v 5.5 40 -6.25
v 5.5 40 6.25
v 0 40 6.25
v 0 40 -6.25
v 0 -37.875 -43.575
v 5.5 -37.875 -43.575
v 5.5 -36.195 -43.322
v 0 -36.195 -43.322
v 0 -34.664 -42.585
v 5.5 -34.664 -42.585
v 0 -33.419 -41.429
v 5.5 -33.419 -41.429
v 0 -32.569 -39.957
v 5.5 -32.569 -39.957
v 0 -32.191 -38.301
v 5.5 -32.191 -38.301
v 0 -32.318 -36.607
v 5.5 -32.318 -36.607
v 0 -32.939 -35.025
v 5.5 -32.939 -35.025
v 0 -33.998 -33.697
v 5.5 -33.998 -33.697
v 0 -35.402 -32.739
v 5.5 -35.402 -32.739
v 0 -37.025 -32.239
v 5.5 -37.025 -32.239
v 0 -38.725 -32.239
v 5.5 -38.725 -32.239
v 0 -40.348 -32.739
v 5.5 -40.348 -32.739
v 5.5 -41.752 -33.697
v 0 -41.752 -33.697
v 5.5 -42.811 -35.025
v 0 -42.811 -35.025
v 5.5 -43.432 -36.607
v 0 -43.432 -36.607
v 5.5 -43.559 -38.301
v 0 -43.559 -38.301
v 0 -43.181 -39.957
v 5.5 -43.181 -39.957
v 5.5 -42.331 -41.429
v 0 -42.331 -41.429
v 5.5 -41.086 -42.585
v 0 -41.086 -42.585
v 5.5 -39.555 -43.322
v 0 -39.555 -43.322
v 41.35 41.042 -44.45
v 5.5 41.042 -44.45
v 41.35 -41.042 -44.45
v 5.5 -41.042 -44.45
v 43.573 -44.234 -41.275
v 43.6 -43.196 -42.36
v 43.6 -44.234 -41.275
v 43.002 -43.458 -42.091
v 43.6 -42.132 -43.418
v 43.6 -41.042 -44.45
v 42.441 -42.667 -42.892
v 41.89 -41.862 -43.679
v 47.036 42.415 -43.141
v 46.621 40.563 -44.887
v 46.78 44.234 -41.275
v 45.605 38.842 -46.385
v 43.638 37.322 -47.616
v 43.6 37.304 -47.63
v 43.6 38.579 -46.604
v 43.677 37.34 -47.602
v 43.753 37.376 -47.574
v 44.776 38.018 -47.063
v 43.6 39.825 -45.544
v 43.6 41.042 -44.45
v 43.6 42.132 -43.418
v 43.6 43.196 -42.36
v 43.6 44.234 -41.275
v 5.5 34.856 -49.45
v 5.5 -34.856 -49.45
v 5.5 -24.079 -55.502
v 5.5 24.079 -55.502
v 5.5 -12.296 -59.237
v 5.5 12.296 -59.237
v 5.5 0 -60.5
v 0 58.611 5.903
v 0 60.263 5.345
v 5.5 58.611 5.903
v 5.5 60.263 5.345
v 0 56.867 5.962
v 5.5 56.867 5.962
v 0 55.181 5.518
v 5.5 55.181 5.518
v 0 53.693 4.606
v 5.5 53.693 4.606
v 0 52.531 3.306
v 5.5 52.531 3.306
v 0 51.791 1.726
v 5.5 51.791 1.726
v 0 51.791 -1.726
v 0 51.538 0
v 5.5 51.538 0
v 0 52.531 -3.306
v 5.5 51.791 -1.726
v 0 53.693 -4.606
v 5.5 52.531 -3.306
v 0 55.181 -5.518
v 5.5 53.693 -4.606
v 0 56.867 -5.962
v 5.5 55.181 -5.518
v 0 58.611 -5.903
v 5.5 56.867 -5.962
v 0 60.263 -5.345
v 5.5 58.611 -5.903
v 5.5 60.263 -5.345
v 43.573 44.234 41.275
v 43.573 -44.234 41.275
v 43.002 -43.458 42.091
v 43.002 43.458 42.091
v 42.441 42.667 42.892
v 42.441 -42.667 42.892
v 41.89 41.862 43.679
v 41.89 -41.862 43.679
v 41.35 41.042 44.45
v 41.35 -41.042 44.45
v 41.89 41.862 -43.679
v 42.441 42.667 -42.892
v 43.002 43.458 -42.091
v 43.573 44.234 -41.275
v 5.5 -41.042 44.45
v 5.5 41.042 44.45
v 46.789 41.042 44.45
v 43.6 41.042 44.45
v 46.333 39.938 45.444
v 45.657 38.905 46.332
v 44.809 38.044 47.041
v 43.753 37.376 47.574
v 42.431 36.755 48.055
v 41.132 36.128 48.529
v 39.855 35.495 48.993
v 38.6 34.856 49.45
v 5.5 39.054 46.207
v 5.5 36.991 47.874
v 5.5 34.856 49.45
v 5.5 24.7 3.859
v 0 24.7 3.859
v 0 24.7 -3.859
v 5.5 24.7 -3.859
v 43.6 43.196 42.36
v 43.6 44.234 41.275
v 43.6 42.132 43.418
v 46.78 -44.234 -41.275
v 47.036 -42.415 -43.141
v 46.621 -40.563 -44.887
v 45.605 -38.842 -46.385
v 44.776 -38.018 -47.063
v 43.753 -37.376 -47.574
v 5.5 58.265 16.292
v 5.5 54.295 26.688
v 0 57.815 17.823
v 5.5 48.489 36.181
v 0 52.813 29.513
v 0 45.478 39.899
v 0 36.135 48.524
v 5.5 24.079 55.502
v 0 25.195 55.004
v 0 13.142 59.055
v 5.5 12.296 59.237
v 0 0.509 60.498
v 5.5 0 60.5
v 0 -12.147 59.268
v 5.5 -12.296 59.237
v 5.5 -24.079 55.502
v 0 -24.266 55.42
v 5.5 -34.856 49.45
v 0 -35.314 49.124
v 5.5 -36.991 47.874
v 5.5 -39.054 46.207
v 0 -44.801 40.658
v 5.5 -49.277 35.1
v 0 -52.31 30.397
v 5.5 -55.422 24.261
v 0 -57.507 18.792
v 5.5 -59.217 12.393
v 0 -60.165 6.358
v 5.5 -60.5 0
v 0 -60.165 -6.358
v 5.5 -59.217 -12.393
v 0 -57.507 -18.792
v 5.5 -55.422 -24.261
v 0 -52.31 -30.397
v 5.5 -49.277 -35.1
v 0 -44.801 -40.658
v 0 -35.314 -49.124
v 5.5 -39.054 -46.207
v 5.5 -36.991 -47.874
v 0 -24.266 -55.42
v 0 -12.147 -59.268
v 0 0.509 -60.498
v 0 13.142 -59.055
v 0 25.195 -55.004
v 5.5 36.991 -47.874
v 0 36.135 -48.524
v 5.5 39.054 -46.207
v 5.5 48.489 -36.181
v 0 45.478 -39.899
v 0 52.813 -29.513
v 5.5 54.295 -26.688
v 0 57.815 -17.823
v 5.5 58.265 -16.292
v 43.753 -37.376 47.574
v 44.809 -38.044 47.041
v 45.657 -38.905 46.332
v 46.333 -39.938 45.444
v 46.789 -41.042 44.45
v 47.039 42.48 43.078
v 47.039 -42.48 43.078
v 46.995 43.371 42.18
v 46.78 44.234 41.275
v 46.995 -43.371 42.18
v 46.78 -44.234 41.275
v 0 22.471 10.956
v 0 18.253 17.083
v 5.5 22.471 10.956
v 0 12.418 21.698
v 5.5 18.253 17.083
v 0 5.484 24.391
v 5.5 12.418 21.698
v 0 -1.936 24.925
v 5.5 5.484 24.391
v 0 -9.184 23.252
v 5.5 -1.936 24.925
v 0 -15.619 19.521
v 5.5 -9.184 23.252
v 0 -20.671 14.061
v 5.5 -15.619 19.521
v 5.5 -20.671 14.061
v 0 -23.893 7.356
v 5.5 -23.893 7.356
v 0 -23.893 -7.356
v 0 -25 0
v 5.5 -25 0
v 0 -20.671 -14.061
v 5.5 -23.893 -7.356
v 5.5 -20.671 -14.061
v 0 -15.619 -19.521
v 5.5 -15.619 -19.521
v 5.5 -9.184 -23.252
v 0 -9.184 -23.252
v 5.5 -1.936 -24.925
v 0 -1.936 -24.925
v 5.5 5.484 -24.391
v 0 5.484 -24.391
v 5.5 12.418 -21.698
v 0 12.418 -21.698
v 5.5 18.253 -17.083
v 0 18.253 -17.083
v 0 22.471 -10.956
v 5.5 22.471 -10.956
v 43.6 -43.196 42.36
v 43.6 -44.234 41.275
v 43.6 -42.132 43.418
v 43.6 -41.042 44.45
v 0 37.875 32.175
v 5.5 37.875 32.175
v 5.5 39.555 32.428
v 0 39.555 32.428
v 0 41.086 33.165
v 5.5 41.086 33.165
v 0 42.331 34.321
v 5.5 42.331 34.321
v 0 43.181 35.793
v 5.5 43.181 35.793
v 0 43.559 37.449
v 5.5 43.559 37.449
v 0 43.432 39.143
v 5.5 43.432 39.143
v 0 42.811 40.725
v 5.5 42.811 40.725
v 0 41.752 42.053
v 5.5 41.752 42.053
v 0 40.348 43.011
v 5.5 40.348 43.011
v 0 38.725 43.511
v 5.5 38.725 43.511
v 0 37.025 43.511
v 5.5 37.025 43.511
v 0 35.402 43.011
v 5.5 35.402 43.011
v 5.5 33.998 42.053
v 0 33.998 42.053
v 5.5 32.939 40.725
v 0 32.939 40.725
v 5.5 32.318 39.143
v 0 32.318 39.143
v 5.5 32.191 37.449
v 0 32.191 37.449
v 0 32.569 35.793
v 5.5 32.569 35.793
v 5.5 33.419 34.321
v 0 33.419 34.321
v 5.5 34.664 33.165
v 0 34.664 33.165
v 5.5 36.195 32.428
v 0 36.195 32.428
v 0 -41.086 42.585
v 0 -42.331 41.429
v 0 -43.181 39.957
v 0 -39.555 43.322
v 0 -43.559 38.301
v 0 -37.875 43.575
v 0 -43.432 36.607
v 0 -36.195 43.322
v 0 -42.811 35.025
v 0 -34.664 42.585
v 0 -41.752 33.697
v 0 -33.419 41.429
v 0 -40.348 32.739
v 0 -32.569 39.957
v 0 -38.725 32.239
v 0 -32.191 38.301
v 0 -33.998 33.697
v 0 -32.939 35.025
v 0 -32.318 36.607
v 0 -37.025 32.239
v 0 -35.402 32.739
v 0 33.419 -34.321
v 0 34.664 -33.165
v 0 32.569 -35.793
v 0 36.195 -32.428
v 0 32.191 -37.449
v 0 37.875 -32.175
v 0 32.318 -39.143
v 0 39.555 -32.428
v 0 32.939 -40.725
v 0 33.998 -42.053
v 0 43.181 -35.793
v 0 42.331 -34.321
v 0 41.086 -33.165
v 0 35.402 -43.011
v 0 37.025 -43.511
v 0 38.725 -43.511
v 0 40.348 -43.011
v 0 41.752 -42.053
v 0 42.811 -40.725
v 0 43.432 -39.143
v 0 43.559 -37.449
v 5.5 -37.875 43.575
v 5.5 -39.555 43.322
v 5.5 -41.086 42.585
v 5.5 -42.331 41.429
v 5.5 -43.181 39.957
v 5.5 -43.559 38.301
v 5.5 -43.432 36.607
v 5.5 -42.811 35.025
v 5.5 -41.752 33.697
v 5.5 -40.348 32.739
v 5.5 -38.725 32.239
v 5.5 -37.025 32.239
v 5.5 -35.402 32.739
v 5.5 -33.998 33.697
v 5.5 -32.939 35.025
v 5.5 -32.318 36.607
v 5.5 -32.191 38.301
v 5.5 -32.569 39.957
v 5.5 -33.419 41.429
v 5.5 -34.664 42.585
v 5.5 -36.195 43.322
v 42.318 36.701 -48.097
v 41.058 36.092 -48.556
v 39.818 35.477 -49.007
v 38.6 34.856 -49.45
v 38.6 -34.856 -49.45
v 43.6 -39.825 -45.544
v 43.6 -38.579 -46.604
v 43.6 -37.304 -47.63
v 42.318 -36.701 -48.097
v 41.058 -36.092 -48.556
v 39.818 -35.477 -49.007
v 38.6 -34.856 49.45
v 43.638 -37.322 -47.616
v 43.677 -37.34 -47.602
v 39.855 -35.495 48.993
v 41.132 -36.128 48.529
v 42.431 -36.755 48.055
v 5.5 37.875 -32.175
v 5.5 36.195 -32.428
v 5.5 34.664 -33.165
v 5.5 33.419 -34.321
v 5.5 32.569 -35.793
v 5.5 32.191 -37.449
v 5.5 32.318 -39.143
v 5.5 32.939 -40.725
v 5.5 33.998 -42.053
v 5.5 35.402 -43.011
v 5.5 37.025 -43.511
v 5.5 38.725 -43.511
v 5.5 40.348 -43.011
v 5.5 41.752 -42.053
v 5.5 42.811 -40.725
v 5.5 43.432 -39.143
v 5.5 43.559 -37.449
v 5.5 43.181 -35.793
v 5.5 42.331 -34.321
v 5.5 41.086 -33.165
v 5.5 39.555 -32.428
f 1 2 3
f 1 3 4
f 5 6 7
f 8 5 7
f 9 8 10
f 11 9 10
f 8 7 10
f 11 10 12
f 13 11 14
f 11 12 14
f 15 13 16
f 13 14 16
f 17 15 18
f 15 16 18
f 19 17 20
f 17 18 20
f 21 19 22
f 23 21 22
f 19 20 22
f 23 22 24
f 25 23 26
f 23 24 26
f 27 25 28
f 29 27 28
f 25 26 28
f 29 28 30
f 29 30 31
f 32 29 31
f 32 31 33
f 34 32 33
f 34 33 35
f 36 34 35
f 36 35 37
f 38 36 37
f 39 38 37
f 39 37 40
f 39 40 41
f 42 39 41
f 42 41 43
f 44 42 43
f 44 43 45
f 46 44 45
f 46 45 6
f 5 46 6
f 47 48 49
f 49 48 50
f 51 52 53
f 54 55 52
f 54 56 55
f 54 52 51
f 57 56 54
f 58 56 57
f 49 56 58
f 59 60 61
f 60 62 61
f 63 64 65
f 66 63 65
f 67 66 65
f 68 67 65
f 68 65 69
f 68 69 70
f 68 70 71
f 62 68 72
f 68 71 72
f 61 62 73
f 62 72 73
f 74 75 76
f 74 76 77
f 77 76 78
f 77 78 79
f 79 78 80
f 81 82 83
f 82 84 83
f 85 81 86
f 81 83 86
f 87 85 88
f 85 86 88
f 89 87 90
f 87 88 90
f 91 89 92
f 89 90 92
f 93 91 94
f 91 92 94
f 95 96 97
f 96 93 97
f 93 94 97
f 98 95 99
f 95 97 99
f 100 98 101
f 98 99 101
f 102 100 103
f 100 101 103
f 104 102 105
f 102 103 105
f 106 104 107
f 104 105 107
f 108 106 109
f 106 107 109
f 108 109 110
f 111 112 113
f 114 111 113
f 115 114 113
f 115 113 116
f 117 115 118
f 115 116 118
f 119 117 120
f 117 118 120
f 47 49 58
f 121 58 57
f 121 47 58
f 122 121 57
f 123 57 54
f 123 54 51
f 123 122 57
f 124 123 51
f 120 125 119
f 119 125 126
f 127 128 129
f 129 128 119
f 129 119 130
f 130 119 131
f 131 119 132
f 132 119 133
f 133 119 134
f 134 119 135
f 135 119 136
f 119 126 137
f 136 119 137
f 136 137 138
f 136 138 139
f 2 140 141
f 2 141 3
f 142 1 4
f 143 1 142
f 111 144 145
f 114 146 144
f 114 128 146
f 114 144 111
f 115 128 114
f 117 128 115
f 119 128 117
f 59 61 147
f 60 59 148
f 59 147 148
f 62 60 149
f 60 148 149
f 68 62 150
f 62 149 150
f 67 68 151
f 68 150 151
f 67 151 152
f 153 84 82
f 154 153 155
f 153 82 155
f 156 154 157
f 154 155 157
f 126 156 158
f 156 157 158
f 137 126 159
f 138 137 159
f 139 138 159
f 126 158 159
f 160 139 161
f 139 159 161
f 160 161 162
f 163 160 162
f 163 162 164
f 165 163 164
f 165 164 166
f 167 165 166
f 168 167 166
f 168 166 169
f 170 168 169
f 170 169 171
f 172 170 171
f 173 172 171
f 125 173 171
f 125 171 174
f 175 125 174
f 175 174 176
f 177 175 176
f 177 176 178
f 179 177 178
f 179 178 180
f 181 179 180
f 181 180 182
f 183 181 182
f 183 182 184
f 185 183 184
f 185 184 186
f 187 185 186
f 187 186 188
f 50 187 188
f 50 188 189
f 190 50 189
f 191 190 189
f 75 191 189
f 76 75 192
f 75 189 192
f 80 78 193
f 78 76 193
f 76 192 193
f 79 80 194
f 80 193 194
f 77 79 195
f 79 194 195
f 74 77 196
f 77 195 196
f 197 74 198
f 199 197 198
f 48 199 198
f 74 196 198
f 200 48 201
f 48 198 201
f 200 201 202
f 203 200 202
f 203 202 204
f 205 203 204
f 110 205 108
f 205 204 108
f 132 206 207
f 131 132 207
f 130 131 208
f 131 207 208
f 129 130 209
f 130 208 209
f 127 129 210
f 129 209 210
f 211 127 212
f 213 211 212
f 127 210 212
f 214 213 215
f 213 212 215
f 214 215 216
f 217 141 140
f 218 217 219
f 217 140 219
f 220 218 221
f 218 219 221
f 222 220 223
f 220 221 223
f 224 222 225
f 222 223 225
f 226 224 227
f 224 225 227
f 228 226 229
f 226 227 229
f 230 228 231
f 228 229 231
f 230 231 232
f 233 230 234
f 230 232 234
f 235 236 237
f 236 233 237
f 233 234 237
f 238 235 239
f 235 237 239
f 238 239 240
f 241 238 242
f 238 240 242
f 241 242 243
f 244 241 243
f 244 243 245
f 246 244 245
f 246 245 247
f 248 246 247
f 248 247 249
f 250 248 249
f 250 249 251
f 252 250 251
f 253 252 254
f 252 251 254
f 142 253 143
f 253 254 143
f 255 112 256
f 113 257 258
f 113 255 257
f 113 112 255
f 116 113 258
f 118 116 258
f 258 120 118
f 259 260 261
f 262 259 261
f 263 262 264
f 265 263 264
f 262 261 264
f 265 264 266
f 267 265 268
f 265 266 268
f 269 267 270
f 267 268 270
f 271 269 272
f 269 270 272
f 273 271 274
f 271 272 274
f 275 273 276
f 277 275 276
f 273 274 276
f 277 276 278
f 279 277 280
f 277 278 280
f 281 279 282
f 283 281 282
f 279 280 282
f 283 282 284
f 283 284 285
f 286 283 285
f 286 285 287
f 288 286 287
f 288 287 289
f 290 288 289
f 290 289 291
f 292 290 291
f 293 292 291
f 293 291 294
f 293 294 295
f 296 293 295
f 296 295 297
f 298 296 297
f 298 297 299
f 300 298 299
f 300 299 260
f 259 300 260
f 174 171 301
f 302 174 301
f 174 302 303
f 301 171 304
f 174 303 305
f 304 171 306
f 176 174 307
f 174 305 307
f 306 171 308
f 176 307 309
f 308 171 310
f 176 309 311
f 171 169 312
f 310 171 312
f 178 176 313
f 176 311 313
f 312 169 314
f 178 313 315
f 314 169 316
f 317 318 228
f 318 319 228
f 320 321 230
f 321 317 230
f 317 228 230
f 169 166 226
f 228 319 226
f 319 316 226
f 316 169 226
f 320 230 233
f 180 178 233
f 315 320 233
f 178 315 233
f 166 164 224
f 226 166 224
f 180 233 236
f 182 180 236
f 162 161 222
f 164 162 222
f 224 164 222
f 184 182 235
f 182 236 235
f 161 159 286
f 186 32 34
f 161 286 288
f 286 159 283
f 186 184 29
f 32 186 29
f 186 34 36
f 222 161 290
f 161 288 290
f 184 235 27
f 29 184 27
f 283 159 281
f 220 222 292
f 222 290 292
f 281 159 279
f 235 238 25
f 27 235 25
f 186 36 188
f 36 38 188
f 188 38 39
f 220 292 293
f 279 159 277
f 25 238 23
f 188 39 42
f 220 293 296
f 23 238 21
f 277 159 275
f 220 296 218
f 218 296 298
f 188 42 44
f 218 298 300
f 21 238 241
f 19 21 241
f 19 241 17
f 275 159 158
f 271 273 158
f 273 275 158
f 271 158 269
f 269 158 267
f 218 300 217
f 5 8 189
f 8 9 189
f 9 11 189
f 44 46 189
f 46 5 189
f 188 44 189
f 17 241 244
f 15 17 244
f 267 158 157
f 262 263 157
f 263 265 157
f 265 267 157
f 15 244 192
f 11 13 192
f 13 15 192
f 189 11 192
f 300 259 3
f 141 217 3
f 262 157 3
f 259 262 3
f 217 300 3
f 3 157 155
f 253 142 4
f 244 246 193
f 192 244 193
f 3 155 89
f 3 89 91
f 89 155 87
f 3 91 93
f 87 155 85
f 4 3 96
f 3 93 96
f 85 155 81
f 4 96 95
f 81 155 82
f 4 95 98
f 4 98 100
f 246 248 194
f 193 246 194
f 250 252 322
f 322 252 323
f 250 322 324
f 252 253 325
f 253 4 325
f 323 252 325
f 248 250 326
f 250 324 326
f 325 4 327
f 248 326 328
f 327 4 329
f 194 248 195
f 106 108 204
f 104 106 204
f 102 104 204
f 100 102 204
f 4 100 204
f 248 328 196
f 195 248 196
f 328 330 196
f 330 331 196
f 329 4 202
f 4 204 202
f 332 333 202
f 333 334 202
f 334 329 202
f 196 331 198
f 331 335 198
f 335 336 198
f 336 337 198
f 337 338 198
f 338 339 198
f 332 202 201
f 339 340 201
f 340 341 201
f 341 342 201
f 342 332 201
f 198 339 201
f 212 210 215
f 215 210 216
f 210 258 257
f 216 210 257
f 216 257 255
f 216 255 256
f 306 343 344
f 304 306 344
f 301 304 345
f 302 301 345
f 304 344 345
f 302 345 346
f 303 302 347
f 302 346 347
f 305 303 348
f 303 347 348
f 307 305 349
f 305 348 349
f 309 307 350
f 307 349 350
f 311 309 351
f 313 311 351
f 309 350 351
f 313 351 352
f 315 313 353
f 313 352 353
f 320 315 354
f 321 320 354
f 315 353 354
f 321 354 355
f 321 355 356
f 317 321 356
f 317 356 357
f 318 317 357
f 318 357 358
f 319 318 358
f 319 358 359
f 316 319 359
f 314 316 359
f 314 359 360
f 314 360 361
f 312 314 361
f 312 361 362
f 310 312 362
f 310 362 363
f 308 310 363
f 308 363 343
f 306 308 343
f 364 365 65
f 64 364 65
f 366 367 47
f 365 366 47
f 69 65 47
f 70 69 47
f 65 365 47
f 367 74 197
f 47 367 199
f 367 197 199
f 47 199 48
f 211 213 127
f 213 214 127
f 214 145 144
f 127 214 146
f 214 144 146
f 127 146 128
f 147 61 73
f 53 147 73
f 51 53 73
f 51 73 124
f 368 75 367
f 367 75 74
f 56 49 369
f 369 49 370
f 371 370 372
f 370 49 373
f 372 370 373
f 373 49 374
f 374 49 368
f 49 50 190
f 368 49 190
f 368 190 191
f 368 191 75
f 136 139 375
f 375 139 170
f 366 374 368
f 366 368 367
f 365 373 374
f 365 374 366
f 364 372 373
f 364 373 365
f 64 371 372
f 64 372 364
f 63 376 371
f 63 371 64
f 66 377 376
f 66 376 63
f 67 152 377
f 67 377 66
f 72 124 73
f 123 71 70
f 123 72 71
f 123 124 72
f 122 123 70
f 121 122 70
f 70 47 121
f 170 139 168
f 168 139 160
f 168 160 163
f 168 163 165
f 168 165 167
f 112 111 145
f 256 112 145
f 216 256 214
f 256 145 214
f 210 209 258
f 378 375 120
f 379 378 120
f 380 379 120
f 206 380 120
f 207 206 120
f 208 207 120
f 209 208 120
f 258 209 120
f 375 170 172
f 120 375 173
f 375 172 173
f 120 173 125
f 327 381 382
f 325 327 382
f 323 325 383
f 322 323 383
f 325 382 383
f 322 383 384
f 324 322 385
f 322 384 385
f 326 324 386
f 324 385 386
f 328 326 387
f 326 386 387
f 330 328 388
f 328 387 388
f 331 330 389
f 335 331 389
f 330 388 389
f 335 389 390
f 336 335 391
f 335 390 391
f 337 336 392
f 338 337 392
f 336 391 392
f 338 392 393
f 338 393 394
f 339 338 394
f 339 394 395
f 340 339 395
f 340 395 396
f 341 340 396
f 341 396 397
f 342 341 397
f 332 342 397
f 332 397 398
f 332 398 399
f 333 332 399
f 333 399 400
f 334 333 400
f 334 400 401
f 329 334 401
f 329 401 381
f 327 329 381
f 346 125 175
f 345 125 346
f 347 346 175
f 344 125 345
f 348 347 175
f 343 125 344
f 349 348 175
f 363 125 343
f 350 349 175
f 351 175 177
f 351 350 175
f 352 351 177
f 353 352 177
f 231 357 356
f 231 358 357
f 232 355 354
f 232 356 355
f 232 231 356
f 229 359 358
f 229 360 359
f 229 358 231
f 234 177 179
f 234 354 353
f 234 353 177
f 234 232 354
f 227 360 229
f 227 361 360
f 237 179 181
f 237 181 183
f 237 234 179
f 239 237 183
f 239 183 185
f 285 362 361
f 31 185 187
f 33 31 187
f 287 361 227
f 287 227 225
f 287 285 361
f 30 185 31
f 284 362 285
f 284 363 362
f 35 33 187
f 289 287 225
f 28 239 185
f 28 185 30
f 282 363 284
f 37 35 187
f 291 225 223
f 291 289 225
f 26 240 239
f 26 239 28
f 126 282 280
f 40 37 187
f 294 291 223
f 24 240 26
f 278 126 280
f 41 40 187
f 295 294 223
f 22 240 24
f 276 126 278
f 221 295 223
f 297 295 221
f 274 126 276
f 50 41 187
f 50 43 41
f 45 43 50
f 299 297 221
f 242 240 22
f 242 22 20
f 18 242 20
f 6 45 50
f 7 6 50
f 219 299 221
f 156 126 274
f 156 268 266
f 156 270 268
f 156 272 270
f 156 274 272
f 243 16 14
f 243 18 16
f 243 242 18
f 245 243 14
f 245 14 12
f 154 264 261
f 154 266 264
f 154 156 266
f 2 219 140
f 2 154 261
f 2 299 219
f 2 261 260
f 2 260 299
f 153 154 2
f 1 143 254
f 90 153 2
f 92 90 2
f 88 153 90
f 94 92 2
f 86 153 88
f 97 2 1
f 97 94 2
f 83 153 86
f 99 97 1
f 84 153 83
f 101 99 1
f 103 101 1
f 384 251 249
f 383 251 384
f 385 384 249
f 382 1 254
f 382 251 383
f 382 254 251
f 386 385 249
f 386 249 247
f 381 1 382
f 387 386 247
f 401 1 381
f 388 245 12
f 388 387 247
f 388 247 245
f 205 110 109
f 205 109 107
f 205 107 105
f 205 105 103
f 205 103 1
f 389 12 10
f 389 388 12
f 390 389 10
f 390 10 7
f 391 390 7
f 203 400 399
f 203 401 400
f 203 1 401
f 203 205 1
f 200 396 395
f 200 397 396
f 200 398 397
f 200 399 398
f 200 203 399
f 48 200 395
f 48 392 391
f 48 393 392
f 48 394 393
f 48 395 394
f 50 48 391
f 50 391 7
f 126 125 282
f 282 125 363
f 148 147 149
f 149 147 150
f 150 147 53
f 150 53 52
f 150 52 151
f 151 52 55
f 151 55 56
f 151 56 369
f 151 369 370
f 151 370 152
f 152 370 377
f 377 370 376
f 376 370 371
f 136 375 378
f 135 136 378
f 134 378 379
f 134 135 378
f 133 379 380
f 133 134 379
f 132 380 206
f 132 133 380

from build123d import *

# Parameters (mm, degrees)
SKETCH1_R           = 60.5
BOSS_EXTRUDE1_DEPTH = 5.5
SKETCH2_R           = 5.7
SKETCH2_R_2         = 25
CUT_EXTRUDE1_DEPTH  = 86.736514975
BOSS_EXTRUDE2_DEPTH = 38.1
BOSS_EXTRUDE3_DEPTH = 5
CHAMFER1_SIZE       = 10
CHAMFER1_SIZE_2     = 3.639702343
CHAMFER2_SIZE       = 10
CHAMFER2_SIZE2      = 3.639702343
CHAMFER3_SIZE       = 1.819851171
CHAMFER3_SIZE_2     = 5
CHAMFER4_SIZE       = 5
CHAMFER4_SIZE_2     = 1.819851171
FILLET1_R           = 5
CHAMFER5_SIZE       = 3.213333015
CHAMFER5_SIZE_2     = 2.25
CHAMFER6_SIZE       = 2.25
CHAMFER6_SIZE_2     = 3.213333015
SKETCH5_R           = 6
CUT_EXTRUDE2_DEPTH  = 96.112299108


with BuildPart() as part:
    # Sketch1 → Boss-Extrude1 (new body)
    with BuildSketch(Plane(origin=(0, 0, 0), x_dir=(0, 0, -1), z_dir=(1, 0, 0))):
        Circle(SKETCH1_R)
    extrude(amount=BOSS_EXTRUDE1_DEPTH)

    # Sketch2 → Cut-Extrude1 (cut, through all)
    with BuildSketch(Plane(origin=(5.5, 0, 0), x_dir=(0, 0, -1), z_dir=(1, 0, 0))):
        with Locations((-37.875, 37.875)):
            Circle(SKETCH2_R)
        with Locations(Location((37.875, 37.875, 0), (0, 0, 180))):
            Circle(SKETCH2_R)
        with Locations((37.875, -37.875)):
            Circle(SKETCH2_R)
        with Locations(Location((-37.875, -37.875, 0), (0, 0, 180))):
            Circle(SKETCH2_R)
        Circle(SKETCH2_R_2)
    extrude(amount=-CUT_EXTRUDE1_DEPTH, mode=Mode.SUBTRACT)

    # Sketch3 → Boss-Extrude2 (add)
    with BuildSketch(Plane(origin=(5.5, 0, 0), x_dir=(0, 0, -1), z_dir=(1, 0, 0))):
        with BuildLine():
            ThreePointArc((-44.45, 41.042021149), (-47.05176845, 38.03131717), (-49.45, 34.856097028))
            Line((-49.45, 34.856097028), (-49.45, -34.856097028))
            ThreePointArc((-49.45, -34.856097028), (-47.05176845, -38.03131717), (-44.45, -41.042021149))
            Line((-44.45, -41.042021149), (-44.45, 41.042021149))
        make_face()
        with BuildLine():
            ThreePointArc((49.45, 34.856097028), (47.05176845, 38.03131717), (44.45, 41.042021149))
            Line((44.45, 41.042021149), (44.45, -41.042021149))
            ThreePointArc((44.45, -41.042021149), (47.05176845, -38.03131717), (49.45, -34.856097028))
            Line((49.45, -34.856097028), (49.45, 34.856097028))
        make_face()
    extrude(amount=BOSS_EXTRUDE2_DEPTH)

    # Sketch4 → Boss-Extrude3 (add)
    with BuildSketch(Plane(origin=(43.6, 0, 0), x_dir=(0, 0, -1), z_dir=(1, 0, 0))):
        with BuildLine():
            Line((-41.275, -44.233747015), (-41.275, 44.233747015))
            ThreePointArc((-41.275, 44.233747015), (-42.892198414, 42.667426865), (-44.45, 41.042021149))
            Line((-44.45, 41.042021149), (-44.45, -41.042021149))
            ThreePointArc((-44.45, -41.042021149), (-42.892198414, -42.667426865), (-41.275, -44.233747015))
        make_face()
        with BuildLine():
            Line((-49.45, 34.856097028), (-49.45, -34.856097028))
            ThreePointArc((-49.45, -34.856097028), (-47.05176845, -38.03131717), (-44.45, -41.042021149))
            Line((-44.45, -41.042021149), (-44.45, 41.042021149))
            ThreePointArc((-44.45, 41.042021149), (-47.05176845, 38.03131717), (-49.45, 34.856097028))
        make_face()
        with BuildLine():
            Line((49.45, -34.856097028), (49.45, 34.856097028))
            ThreePointArc((49.45, 34.856097028), (45.604182769, 39.755609842), (41.275, 44.233747015))
            Line((41.275, 44.233747015), (41.275, -44.233747015))
            ThreePointArc((41.275, -44.233747015), (45.604182769, -39.755609842), (49.45, -34.856097028))
        make_face()
    extrude(amount=BOSS_EXTRUDE3_DEPTH)

    # Chamfer1
    # the kernel refuses this chamfer: 10, 3.639702343 mm, written as the material it takes off along each edge
    with BuildSketch(Plane(origin=(48.6, 60.798044353, 49.45), x_dir=(-0.9999130865277315, 0, 0.013184058198646176), z_dir=(0, -1, 0))) as chamfer1_piece_1:
        Polygon((CHAMFER1_SIZE * 0.999913086528, CHAMFER1_SIZE * 0.0131840581986), (-CHAMFER1_SIZE_2 * 0.0131840581974, CHAMFER1_SIZE_2 * 0.999913086435), (0, 0), align=None)
    extrude(amount=121.596088706, mode=Mode.SUBTRACT)

    # Chamfer2
    chamfer2_edges = [part.edges().sort_by_distance(p)[0] for p in [
        (48.6, 0, -49.45),
    ]]
    chamfer2_side = [part.faces().sort_by_distance(p)[0] for p in [
        (27.05, 0, -49.45),
    ]]
    chamfer(chamfer2_edges, length=CHAMFER2_SIZE, length2=CHAMFER2_SIZE2, reference=chamfer2_side[0])

    # Chamfer3
    # the kernel refuses this chamfer: 5, 1.819851171 mm, written as the material it takes off along each edge
    with BuildSketch(Plane(origin=(48.6, -57.204720678, 41.275), x_dir=(-0.9950833631817487, 0, -0.09904090225204971), z_dir=(0, 1, 0))) as chamfer3_piece_1:
        Polygon((CHAMFER3_SIZE * 0.995083363363, CHAMFER3_SIZE * 0.0990409022701), (-CHAMFER3_SIZE_2 * 0.099040902252, CHAMFER3_SIZE_2 * 0.995083363182), (0, 0), align=None)
    extrude(amount=114.409441356, mode=Mode.SUBTRACT)

    # Chamfer4
    # the kernel refuses this chamfer: 5, 1.819851171 mm, written as the material it takes off along each edge
    with BuildSketch(Plane(origin=(48.6, 57.204720678, -41.275), x_dir=(0.013184058198646176, 0, -0.9999130865277315), z_dir=(0, -1, 0))) as chamfer4_piece_1:
        Polygon((CHAMFER4_SIZE * 0.999913086528, -CHAMFER4_SIZE * 0.0131840581986), (-CHAMFER4_SIZE_2 * 0.013184058201, -CHAMFER4_SIZE_2 * 0.99991308671), (0, 0), align=None)
    extrude(amount=114.409441356, mode=Mode.SUBTRACT)

    # Fillet1
    # the kernel refuses this fillet: 5 mm, written as the material it takes off along each edge
    with BuildSketch(Plane(origin=(48.450647546, -51.951472504, -45.864657505), x_dir=(-0.9396926207859081, 0, -0.34202014332566955), z_dir=(0, 1, 0))) as fillet1_piece_1:
        with BuildLine():
            CenterArc((4.998659123, 5), FILLET1_R, 181.326957093, 88.673042907)
            Line((0, 4.8842115), (-0.099973182, 4.88189573))
            ThreePointArc((-0.099973182, 4.88189573), (-0.1, 2.44210575), (-0.1, 0))
            Line((-0.1, 0), (0, -0.1))
            Line((0, -0.1), (4.998659123, -0.1))
            Line((4.998659123, -0.1), (4.998659123, 0))
        make_face()
    extrude(amount=103.902945009, mode=Mode.SUBTRACT)
    with BuildSketch(Plane(origin=(48.450647546, -51.951472504, 45.864657505), x_dir=(-0.9396926207857893, 0, 0.3420201433259962), z_dir=(0, 1, 0))) as fillet1_piece_2:
        with BuildLine():
            CenterArc((4.998659123, -5), FILLET1_R, 90, 88.673042907)
            Line((0, -4.8842115), (-0.099973182, -4.88189573))
            ThreePointArc((-0.099973182, -4.88189573), (-0.1, -2.44210575), (-0.1, 0))
            Line((-0.1, 0), (0, 0.1))
            Line((0, 0.1), (4.998659123, 0.1))
            Line((4.998659123, 0.1), (4.998659123, 0))
        make_face()
    extrude(amount=103.902945009, mode=Mode.SUBTRACT)

    # Chamfer5
    # the kernel refuses this chamfer: 3.213333015, 2.25 mm, written as the material it adds along each edge
    with BuildSketch(Plane(origin=(43.6, -49.340621494, 44.45), x_dir=(0.02220967419845722, 0, -0.99975333476413), z_dir=(0, 1, 0))) as chamfer5_piece_1_section:
        Polygon((CHAMFER5_SIZE * 0.999753334817, CHAMFER5_SIZE * 0.0222096741996), (-CHAMFER5_SIZE_2 * 0.0222096741985, CHAMFER5_SIZE_2 * 0.999753334764), (0, 0), align=None)
    chamfer5_piece_1 = extrude(amount=98.681242988, mode=Mode.PRIVATE)
    chamfer5_piece_1 = chamfer5_piece_1 & Plane(origin=(42.872647852, 0, 0), x_dir=(0, 0, -1), z_dir=(-1, 0, 0)) * Cylinder(60.5, 211, mode=Mode.PRIVATE)
    chamfer5_piece_1 = split(chamfer5_piece_1, bisect_by=Plane(origin=(42.872647852, 1e-09, 41.275), z_dir=(0, 0, 1)), keep=Keep.TOP, mode=Mode.PRIVATE)
    add(chamfer5_piece_1)

    # Chamfer6
    # the kernel refuses this chamfer: 3.213333015, 2.25 mm, written as the material it adds along each edge
    with BuildSketch(Plane(origin=(43.6, 49.340621494, -44.45), x_dir=(-0.9989750717851553, 0, -0.04526373771402063), z_dir=(0, -1, 0))) as chamfer6_piece_1_section:
        Polygon((CHAMFER6_SIZE * 0.998975071785, -CHAMFER6_SIZE * 0.045263737714), (-CHAMFER6_SIZE_2 * 0.0452637377164, -CHAMFER6_SIZE_2 * 0.998975071838), (0, 0), align=None)
    chamfer6_piece_1 = extrude(amount=98.681242988, mode=Mode.PRIVATE)
    chamfer6_piece_1 = chamfer6_piece_1 & Plane(origin=(42.872647852, 0, 0), x_dir=(0, 0, -1), z_dir=(-1, 0, 0)) * Cylinder(60.5, 211, mode=Mode.PRIVATE)
    chamfer6_piece_1 = split(chamfer6_piece_1, bisect_by=Plane(origin=(42.872647852, -1e-09, -41.275), z_dir=(0, 0, -1)), keep=Keep.TOP, mode=Mode.PRIVATE)
    add(chamfer6_piece_1)

    # Sketch5 → Cut-Extrude2 (cut, through all)
    with BuildSketch(Plane(origin=(5.5, 0, 0), x_dir=(0, 0, -1), z_dir=(1, 0, 0))):
        with Locations((0, 57.537769206)):
            Circle(SKETCH5_R)
        Polygon((0, 0), (-6.25, 40), (6.25, 40), align=None)
    extrude(amount=-CUT_EXTRUDE2_DEPTH, mode=Mode.SUBTRACT)


solid = part.part
